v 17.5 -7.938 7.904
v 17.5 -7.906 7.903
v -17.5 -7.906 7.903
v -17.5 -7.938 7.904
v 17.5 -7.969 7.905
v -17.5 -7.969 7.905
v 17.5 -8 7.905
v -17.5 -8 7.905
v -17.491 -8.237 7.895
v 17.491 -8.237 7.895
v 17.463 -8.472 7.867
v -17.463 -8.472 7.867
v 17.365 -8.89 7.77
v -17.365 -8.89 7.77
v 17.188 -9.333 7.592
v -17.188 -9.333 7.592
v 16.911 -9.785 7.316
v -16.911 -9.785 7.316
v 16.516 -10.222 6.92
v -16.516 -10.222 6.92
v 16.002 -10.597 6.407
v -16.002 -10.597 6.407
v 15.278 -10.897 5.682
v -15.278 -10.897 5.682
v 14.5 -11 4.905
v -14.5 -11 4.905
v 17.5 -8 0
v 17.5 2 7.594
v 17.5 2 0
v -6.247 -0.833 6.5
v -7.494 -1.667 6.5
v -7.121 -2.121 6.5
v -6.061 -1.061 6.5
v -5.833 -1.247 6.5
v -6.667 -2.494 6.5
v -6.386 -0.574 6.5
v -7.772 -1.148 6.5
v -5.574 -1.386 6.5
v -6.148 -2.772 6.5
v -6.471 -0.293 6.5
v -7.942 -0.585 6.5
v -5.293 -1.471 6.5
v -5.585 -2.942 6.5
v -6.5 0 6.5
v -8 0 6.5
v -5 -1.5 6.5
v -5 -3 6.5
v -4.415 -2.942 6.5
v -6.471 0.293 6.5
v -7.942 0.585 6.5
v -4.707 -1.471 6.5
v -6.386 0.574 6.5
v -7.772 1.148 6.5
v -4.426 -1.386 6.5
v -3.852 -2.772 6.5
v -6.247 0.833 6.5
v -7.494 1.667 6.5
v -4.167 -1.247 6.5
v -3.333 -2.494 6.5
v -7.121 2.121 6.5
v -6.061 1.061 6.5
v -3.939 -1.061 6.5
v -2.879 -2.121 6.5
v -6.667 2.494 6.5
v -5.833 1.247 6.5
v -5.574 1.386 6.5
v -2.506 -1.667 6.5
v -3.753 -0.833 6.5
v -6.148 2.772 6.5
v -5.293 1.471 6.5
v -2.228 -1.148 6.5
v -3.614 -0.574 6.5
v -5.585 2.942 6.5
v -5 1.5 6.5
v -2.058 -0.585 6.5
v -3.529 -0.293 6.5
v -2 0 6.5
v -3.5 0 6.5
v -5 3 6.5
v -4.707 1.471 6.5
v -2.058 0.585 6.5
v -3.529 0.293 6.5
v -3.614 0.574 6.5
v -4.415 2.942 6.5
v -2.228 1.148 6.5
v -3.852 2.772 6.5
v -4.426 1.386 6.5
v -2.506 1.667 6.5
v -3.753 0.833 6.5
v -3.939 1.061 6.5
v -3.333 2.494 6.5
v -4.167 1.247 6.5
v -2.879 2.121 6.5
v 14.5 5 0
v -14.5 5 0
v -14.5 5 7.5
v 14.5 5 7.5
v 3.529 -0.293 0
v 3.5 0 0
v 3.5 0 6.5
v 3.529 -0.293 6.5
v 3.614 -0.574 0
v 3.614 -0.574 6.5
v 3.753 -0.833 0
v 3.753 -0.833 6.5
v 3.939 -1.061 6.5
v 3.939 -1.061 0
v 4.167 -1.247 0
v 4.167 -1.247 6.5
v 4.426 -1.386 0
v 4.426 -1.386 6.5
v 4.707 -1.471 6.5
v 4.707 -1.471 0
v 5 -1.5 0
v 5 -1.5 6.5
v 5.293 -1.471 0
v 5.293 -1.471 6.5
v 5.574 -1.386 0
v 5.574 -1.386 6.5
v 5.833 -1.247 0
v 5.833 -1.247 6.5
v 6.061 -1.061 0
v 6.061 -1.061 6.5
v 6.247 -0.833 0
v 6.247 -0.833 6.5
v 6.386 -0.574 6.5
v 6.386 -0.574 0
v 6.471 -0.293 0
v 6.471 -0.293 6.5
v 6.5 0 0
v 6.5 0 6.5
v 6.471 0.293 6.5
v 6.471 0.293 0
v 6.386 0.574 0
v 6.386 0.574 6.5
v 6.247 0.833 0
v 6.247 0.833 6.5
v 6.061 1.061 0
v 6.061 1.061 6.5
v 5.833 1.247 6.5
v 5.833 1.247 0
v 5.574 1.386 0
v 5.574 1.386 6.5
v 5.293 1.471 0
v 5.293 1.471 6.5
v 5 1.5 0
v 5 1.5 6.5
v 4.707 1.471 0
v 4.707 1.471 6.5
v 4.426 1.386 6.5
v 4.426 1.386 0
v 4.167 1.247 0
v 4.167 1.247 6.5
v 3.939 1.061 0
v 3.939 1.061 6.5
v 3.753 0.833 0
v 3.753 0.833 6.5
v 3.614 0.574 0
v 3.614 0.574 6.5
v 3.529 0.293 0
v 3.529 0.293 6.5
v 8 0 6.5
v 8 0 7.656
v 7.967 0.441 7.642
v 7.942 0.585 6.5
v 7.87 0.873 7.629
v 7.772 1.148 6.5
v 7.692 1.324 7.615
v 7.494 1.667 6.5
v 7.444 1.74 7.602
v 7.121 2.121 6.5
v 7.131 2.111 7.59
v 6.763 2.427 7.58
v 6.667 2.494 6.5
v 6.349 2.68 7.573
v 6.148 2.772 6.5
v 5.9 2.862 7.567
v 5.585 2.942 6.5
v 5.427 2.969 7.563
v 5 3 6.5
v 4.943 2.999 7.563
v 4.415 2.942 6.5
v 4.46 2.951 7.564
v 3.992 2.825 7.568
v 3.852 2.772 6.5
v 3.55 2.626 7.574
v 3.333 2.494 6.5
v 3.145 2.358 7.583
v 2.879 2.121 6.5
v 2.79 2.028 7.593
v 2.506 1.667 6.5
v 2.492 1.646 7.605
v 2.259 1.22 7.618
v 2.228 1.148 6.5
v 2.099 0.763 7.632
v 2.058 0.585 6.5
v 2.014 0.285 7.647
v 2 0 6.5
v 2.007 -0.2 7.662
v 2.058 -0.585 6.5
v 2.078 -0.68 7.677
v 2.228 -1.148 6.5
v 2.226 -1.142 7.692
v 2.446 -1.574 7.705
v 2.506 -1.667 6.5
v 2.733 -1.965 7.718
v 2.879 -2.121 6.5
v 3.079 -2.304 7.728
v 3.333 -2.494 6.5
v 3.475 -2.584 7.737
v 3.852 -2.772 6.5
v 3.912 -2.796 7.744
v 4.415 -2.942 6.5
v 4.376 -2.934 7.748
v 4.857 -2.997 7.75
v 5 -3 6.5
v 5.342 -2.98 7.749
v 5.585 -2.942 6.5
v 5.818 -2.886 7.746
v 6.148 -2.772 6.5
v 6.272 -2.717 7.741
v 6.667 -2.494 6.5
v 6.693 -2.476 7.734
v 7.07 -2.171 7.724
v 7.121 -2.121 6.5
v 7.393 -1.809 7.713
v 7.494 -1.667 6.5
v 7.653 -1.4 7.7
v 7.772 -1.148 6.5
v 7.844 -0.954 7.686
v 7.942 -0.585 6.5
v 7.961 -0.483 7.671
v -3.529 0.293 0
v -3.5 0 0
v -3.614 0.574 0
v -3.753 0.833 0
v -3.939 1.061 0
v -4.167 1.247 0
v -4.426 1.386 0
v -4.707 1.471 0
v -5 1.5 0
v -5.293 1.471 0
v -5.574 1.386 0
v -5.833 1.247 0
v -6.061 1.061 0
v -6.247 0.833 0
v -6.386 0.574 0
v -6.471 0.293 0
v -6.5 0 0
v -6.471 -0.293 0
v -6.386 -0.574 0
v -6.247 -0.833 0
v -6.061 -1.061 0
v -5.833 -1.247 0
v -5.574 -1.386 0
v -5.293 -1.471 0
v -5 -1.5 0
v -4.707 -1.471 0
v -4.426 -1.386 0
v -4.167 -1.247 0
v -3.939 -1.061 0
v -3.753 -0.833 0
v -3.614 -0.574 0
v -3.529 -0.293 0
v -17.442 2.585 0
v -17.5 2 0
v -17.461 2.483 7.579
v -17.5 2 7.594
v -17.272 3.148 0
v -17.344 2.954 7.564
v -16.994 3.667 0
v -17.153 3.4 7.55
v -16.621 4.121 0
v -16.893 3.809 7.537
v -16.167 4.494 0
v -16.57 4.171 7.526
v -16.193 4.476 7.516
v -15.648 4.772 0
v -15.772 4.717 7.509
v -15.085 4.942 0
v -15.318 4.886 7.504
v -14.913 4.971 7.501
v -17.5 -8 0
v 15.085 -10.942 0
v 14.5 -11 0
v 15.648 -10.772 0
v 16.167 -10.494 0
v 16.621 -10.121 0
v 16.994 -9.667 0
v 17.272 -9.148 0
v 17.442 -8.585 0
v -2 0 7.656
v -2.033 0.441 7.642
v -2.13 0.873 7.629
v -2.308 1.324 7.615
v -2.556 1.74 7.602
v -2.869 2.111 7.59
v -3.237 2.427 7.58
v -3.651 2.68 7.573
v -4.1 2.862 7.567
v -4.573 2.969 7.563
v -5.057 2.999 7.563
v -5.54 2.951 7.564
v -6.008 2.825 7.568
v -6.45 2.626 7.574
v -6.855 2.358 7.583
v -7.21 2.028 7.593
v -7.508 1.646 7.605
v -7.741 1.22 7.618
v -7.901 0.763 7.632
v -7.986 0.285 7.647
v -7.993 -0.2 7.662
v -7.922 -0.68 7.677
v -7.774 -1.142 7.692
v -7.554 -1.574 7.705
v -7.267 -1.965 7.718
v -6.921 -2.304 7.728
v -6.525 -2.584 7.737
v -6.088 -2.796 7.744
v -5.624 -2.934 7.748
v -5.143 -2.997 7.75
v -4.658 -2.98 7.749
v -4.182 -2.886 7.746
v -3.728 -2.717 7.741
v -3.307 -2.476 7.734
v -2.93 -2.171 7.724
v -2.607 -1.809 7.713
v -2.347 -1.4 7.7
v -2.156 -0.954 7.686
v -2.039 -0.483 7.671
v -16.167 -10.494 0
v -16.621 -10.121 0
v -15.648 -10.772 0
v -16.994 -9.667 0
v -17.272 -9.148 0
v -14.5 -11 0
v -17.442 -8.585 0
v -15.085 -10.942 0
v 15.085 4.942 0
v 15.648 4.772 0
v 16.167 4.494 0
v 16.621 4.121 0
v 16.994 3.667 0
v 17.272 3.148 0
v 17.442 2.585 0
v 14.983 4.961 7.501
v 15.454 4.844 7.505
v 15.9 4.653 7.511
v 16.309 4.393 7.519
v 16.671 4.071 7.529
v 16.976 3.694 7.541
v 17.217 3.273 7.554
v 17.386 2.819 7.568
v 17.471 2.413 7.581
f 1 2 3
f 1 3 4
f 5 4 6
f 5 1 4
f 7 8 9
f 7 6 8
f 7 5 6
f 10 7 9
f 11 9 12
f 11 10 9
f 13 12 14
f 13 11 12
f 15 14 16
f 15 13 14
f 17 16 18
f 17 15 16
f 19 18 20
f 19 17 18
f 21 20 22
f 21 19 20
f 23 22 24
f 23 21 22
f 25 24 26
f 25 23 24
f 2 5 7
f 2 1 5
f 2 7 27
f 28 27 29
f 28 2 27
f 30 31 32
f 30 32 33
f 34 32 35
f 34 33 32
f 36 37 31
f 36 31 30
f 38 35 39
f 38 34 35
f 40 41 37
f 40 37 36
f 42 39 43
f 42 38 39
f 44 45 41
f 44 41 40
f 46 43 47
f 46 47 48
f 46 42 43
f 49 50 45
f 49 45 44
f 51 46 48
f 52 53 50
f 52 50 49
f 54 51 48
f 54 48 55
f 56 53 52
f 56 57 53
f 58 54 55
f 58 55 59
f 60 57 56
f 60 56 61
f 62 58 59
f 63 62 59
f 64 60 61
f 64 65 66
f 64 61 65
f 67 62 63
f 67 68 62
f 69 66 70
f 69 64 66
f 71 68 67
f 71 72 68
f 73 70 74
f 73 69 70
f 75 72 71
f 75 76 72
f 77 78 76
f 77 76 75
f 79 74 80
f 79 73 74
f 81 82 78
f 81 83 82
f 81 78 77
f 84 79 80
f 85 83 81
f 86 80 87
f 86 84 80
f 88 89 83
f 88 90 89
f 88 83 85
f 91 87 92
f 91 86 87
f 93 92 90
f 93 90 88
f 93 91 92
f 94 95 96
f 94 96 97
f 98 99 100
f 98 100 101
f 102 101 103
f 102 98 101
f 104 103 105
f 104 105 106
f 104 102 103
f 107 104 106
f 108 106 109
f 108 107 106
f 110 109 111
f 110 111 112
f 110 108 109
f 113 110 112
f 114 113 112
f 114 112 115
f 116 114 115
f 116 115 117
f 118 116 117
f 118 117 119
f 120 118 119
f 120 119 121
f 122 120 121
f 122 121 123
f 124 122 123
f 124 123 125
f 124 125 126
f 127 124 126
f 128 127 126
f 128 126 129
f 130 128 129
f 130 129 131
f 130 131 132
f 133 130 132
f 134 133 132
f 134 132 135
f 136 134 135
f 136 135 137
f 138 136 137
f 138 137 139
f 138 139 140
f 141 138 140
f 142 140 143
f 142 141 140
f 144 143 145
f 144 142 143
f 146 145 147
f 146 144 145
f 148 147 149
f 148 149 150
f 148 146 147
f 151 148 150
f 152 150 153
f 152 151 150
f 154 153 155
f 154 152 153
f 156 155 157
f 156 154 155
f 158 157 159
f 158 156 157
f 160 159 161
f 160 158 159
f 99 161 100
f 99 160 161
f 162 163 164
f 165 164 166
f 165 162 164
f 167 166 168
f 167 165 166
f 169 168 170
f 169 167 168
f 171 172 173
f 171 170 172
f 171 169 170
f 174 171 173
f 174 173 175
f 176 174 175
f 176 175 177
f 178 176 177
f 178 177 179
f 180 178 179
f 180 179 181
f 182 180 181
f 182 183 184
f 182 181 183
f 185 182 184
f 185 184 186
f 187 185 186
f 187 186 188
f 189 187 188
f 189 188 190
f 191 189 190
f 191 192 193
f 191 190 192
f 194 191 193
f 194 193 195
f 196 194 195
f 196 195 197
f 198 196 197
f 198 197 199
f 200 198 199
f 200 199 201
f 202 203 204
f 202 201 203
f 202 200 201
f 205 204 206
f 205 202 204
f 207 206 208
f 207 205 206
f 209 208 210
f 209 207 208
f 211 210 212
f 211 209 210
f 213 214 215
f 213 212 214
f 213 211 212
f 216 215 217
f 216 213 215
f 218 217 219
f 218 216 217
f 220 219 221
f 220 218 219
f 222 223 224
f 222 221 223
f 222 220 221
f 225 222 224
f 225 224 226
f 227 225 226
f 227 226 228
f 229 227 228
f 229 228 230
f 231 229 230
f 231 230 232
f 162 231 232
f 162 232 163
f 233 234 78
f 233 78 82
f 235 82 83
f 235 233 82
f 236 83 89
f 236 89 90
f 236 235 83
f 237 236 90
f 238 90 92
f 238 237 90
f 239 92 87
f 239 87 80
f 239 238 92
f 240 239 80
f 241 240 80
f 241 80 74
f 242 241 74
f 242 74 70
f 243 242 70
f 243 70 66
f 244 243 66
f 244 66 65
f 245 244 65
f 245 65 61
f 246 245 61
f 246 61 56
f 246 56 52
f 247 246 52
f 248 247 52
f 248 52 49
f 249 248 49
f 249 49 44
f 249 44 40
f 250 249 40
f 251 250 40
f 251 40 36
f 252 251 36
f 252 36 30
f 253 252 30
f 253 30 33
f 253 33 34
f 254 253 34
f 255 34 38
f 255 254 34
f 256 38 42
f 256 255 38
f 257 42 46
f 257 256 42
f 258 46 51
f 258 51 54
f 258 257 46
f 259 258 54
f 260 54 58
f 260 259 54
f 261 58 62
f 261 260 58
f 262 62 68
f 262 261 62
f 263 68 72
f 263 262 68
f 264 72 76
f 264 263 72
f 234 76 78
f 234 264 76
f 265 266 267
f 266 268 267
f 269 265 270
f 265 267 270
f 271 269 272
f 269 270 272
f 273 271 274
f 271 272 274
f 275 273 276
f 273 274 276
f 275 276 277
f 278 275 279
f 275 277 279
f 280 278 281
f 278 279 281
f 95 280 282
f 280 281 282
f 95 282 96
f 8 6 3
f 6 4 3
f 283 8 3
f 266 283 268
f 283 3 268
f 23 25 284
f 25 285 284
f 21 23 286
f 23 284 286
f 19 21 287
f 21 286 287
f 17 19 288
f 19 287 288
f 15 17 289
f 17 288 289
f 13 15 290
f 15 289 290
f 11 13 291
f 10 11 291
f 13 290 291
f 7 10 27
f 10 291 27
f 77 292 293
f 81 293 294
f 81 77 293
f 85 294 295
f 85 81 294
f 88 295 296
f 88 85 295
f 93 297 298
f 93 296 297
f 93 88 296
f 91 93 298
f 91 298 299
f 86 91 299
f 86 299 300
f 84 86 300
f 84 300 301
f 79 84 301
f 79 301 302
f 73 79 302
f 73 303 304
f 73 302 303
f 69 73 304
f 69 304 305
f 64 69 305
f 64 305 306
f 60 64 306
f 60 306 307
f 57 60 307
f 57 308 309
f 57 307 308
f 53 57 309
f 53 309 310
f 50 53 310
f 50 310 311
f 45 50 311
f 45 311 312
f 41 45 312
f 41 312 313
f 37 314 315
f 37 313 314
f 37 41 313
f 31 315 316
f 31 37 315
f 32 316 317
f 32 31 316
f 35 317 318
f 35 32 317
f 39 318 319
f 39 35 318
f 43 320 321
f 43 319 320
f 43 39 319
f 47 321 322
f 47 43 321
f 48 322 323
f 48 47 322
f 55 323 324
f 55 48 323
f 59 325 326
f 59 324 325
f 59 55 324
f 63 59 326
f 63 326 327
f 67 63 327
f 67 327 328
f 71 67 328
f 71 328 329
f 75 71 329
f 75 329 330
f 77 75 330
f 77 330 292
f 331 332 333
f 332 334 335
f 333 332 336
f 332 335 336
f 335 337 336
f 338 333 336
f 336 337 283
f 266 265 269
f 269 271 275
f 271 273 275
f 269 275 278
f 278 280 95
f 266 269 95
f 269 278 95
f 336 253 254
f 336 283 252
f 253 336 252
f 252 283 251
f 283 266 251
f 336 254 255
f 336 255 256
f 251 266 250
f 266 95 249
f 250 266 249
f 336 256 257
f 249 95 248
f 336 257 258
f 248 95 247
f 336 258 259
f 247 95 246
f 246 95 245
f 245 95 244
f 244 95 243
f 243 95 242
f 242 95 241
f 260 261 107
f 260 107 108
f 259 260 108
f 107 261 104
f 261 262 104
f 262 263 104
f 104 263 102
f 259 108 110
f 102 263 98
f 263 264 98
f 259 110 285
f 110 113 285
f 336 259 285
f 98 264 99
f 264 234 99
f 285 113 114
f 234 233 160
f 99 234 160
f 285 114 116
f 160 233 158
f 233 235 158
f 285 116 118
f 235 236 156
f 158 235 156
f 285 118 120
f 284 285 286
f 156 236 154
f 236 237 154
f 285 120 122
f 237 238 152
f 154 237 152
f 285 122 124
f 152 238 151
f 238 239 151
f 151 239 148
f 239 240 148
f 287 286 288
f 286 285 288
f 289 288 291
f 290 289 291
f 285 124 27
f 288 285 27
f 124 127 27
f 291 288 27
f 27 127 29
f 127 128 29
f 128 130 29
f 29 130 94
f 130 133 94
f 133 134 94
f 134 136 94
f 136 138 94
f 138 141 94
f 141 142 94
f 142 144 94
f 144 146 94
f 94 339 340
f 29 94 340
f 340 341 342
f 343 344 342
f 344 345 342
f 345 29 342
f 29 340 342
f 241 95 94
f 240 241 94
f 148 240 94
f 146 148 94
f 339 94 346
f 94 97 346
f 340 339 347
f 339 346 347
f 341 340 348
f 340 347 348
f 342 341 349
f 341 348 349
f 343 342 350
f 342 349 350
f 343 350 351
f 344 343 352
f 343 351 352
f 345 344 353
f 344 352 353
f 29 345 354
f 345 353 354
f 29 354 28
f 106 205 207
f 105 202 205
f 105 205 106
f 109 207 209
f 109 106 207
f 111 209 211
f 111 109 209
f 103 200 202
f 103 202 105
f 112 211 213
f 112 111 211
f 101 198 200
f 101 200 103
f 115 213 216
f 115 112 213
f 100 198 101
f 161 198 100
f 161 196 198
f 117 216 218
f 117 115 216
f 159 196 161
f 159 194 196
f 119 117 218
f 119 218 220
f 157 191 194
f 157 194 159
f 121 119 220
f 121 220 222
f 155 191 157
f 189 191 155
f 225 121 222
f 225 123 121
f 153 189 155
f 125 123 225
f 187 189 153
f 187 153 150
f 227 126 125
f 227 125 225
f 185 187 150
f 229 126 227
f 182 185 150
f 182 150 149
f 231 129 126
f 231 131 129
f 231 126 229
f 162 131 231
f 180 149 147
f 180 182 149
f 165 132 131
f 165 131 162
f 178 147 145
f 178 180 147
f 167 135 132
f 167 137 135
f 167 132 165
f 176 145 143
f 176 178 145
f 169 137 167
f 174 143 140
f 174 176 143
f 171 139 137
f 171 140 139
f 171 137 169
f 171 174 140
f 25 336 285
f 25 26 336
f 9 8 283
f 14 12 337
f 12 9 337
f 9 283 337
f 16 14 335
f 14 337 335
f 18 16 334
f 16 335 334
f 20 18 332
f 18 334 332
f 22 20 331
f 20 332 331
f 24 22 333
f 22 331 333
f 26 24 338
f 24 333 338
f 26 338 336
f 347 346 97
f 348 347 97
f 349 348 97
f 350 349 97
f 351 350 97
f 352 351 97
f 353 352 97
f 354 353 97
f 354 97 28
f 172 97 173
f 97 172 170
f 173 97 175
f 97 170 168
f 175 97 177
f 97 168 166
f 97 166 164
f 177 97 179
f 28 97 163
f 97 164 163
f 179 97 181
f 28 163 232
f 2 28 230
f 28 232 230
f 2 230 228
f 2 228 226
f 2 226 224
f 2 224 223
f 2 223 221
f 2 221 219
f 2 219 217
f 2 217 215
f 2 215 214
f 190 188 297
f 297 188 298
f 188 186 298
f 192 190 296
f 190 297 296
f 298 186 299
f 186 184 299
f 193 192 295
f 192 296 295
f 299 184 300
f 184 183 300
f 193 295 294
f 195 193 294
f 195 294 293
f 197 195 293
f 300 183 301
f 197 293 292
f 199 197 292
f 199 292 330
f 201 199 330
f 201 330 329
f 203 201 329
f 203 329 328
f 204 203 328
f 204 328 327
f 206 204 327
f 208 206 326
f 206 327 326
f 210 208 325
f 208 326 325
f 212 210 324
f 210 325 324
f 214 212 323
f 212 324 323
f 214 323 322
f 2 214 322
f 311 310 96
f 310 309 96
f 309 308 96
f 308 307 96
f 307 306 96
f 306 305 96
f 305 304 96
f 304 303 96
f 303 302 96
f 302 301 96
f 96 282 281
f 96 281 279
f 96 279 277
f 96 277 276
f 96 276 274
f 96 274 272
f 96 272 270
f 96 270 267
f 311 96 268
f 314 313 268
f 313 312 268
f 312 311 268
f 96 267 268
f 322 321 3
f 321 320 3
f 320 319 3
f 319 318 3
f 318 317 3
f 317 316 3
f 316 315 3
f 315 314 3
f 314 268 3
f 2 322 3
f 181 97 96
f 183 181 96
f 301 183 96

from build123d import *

# Parameters (mm, degrees)
SKETCH_1_W          = 35
SKETCH_1_H          = 10
SKETCH_1_R          = 1.5
EXTRUDE_1_DEPTH     = 8
CUT_EXTRUDE_START   = -1.5
SKETCH_2_R          = 3
SKETCH_2_R_2        = 1.5
CUT_EXTRUDE_1_DEPTH = 1.5
SKETCH_3_W          = 35
SKETCH_3_H          = 6
EXTRUDE_2_DEPTH     = 8
CUT_EXTRUDE_2_DEPTH = 38.549966711
FILLET_2_R          = 3


with BuildPart() as part:
    # 草图1 → 凸台-拉伸1 (new body)
    with BuildSketch(Plane.XY):
        Rectangle(SKETCH_1_W, SKETCH_1_H)
        with Locations((-5, 0)):
            Circle(SKETCH_1_R, mode=Mode.SUBTRACT)
        with Locations(Location((5, 0, 0), (0, 0, 180))):
            Circle(SKETCH_1_R, mode=Mode.SUBTRACT)
    extrude(amount=EXTRUDE_1_DEPTH)

    # 草图2 → 切除-拉伸1 (cut)
    # profile 1 of 2: a face of its own
    with BuildSketch(Plane.XY.offset(8).offset(CUT_EXTRUDE_START)):
        with Locations((-5, 0)):
            Circle(SKETCH_2_R)
        with Locations((-5, 0)):
            Circle(SKETCH_2_R_2, mode=Mode.SUBTRACT)
    # profile 2 of 2: a face of its own
    with BuildSketch(Plane.XY.offset(8).offset(CUT_EXTRUDE_START)):
        with Locations((5, 0)):
            Circle(SKETCH_2_R)
        with Locations(Location((5, 0, 0), (0, 0, 180))):
            Circle(SKETCH_2_R_2, mode=Mode.SUBTRACT)
    extrude(amount=CUT_EXTRUDE_1_DEPTH, mode=Mode.SUBTRACT)

    # 草图3 → 凸台-拉伸2 (add)
    with BuildSketch(Plane.XY.offset(8)):
        with Locations((0, -8)):
            Rectangle(SKETCH_3_W, SKETCH_3_H)
    extrude(amount=-EXTRUDE_2_DEPTH)

    # 草图4 → 切除-拉伸2 (cut, through all)
    with BuildSketch(Plane.ZY.offset(17.5)):
        Polygon((8, 5), (7.5, 5), (8, -11), align=None)
    extrude(amount=-CUT_EXTRUDE_2_DEPTH, mode=Mode.SUBTRACT)

    # 圆角2
    fillet_2_edges = [part.edges().sort_by_distance(p)[0] for p in [
        (0, -11, 8),
        (-17.5, -11, 4),
        (17.5, -11, 4),
        (-17.5, 5, 3.75),
        (17.5, 5, 3.75),
    ]]
    fillet(fillet_2_edges, radius=FILLET_2_R)


solid = part.part
